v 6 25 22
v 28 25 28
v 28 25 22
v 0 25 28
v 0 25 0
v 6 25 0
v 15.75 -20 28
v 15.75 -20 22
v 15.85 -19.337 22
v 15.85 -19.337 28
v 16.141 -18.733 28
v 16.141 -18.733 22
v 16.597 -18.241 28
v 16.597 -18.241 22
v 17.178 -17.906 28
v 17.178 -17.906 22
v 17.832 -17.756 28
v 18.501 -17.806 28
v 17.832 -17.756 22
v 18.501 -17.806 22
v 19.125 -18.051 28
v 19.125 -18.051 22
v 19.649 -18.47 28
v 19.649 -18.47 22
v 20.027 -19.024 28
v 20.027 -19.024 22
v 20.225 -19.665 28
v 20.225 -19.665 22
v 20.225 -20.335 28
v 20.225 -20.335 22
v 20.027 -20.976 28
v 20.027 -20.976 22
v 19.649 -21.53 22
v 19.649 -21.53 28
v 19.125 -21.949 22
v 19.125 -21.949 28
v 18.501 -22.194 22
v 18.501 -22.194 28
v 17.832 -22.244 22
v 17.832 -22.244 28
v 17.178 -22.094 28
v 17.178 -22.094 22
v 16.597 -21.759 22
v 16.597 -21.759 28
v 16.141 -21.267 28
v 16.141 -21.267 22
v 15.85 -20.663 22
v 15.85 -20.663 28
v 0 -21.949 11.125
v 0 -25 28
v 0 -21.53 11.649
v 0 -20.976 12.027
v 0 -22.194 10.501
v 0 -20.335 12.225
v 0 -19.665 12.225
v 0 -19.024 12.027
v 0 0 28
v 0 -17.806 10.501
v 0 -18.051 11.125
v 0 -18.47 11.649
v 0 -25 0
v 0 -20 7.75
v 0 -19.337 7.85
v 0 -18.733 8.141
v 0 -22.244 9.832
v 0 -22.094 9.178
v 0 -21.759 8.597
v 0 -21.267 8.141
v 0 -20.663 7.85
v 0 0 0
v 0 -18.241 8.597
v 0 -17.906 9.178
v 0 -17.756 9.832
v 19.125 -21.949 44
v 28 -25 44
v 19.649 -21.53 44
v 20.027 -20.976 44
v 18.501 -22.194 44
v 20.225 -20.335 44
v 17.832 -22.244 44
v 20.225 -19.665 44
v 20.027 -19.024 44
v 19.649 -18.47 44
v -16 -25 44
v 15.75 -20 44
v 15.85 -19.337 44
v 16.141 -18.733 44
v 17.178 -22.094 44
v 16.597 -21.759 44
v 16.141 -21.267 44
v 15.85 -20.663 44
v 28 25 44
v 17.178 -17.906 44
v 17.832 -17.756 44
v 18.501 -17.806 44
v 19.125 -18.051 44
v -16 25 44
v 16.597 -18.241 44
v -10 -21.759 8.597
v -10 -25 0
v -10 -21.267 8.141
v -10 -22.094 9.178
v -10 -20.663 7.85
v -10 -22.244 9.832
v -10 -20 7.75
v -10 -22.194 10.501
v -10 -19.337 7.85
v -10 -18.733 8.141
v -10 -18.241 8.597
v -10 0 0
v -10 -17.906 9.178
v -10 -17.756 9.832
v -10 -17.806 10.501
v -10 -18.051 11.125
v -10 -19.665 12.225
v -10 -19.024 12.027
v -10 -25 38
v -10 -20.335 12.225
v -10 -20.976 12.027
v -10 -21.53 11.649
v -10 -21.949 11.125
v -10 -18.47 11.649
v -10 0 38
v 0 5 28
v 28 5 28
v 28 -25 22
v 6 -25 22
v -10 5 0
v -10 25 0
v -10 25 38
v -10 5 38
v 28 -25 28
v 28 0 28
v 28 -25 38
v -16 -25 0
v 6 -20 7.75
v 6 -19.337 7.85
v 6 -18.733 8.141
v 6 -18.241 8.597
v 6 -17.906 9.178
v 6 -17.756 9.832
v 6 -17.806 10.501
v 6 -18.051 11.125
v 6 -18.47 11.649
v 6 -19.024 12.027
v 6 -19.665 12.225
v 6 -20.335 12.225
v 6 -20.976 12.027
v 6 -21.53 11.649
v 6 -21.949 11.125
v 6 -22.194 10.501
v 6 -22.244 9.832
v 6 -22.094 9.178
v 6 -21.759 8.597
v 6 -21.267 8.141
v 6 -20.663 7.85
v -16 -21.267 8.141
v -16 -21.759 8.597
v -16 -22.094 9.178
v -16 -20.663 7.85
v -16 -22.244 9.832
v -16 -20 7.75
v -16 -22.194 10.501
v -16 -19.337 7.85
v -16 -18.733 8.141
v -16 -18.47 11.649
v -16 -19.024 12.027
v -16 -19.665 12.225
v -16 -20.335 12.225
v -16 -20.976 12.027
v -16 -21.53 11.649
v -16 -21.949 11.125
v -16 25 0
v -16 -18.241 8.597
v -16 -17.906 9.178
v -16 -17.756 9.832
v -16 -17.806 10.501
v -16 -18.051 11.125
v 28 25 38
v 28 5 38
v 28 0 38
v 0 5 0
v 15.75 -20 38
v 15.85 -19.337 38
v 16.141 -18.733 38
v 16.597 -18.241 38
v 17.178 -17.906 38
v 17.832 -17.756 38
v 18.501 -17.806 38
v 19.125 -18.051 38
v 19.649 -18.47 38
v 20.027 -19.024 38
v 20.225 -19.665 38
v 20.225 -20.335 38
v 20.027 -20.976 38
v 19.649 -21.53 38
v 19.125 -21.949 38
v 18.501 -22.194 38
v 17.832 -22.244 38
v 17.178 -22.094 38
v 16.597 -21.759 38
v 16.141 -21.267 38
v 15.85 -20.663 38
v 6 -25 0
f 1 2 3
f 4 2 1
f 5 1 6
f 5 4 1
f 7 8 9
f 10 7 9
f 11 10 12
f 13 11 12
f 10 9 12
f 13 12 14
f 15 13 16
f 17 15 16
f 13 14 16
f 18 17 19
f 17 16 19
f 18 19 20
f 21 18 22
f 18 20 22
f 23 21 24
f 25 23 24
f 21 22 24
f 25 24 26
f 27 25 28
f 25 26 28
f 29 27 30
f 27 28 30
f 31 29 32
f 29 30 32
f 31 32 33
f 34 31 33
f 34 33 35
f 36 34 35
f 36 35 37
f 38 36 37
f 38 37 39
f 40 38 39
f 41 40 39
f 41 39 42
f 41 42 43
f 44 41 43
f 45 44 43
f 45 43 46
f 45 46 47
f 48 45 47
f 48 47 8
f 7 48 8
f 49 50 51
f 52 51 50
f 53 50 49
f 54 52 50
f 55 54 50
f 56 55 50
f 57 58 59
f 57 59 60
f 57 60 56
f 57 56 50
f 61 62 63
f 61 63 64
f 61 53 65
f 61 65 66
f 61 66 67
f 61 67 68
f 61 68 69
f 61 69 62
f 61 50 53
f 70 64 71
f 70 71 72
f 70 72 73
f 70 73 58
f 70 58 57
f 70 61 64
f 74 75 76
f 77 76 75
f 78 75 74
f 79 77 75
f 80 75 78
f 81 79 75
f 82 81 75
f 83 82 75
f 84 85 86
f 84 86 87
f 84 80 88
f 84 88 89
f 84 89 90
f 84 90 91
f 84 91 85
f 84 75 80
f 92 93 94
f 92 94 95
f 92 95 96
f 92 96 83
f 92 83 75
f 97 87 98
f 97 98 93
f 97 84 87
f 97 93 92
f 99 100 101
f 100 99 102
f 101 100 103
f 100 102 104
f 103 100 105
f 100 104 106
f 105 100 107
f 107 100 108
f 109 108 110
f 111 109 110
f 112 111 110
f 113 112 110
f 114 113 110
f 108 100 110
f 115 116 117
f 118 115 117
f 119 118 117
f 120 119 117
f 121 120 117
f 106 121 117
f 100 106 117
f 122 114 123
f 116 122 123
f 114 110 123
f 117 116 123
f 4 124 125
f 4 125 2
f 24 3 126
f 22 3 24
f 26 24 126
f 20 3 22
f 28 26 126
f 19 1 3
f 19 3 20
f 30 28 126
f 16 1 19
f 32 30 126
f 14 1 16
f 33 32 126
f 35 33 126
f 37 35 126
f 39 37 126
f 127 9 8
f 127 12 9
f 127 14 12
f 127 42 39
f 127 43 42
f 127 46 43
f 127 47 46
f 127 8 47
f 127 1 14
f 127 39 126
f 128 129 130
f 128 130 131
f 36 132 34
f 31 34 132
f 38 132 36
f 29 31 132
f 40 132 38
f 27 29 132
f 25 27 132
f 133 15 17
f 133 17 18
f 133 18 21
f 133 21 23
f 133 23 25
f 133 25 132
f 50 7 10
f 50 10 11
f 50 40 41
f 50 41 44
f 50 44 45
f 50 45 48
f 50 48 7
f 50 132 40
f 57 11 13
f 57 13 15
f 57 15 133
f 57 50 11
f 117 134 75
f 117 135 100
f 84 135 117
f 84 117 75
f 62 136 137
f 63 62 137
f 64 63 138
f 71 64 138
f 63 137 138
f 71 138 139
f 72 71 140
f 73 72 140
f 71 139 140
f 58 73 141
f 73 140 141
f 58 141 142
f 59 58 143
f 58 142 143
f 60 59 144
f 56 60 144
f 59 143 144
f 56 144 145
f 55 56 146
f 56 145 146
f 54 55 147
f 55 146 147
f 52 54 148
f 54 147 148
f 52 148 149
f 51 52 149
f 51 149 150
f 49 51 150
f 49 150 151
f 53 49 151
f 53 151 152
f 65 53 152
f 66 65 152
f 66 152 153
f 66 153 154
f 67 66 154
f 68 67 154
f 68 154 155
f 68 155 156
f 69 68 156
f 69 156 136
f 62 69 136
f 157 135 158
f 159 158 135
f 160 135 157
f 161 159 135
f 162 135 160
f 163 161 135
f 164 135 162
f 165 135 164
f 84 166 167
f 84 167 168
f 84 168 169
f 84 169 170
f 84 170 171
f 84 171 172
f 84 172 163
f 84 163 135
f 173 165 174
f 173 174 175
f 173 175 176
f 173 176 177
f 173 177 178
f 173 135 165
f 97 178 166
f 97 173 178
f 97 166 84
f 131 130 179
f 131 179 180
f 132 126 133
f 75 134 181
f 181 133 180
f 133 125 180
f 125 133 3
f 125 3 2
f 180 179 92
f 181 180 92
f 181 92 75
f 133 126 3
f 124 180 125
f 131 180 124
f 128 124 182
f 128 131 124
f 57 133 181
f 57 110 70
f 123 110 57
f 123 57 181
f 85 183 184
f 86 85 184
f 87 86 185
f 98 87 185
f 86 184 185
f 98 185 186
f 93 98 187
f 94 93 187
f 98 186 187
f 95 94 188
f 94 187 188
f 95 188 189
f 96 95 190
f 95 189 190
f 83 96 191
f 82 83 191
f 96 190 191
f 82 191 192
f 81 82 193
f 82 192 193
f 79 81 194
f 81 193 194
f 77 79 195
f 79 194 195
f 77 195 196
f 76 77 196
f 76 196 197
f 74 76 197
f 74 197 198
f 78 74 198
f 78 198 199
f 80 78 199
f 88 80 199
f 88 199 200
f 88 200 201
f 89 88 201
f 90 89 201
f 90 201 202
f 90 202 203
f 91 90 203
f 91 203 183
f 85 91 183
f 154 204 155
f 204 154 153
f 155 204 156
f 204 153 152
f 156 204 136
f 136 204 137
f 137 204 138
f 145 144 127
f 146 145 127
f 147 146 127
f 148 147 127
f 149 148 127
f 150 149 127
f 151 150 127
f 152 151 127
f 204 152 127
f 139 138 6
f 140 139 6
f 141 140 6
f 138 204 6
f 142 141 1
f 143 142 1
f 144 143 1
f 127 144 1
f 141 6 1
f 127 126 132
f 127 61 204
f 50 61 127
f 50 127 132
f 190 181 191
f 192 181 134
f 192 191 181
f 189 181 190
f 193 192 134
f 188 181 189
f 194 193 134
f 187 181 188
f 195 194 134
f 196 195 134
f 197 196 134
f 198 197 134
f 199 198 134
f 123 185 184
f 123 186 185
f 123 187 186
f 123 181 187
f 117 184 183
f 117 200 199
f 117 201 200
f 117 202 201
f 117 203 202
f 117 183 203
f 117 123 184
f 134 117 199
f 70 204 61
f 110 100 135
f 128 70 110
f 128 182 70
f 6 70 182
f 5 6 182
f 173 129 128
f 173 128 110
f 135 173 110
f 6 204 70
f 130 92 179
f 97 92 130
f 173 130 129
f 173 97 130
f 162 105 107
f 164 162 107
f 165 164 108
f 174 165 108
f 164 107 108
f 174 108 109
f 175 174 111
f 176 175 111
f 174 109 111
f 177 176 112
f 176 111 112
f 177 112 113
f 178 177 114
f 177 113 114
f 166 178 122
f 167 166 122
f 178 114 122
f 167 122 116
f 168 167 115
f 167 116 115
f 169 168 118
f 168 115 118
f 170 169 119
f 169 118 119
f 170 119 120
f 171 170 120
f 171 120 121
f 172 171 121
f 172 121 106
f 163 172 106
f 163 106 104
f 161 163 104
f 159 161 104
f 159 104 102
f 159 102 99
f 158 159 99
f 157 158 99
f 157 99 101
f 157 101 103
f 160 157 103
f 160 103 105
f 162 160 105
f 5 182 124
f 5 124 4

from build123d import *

# Parameters (mm, degrees)
ESTRUSIONE_ESTRUSIONE1_DEPTH = 28
ESTRUSIONE_ESTRUSIONE2_DEPTH = 16
SCHIZZO4_W                   = 16
SCHIZZO4_H                   = 50
ESTRUSIONE_ESTRUSIONE3_DEPTH = 6
ESTRUSIONE_ESTRUSIONE4_DEPTH = 22
FORO_PER_VITE_M4_1_D         = 4.5
FORO_PER_VITE_M4_1_DEPTH     = 30
FORO_PER_VITE_M4_1_TIP       = 1.351936393
FORO_PER_VITE_M4_2_D         = 4.5
FORO_PER_VITE_M4_2_DEPTH     = 30
FORO_PER_VITE_M4_2_TIP       = 1.351936393


with BuildPart() as part:
    # Schizzo2 → Estrusione-Estrusione1 (new body)
    with BuildSketch(Plane.XY):
        Polygon((0, 0), (-10, 0), (-10, -25), (-16, -25), (-16, 25), (-10, 25), (-10, 5), (0, 5), (0, 25), (6, 25), (6, -25), (0, -25), align=None)
    extrude(amount=ESTRUSIONE_ESTRUSIONE1_DEPTH)

    # Schizzo3 → Estrusione-Estrusione2 (add)
    with BuildSketch(Plane(origin=(6, 0, 0), x_dir=(0, 0, -1), z_dir=(1, 0, 0))):
        Polygon((-28, 0), (-38, 0), (-38, -25), (-44, -25), (-44, 25), (-38, 25), (-38, 5), (-28, 5), align=None)
    extrude(amount=-ESTRUSIONE_ESTRUSIONE2_DEPTH)

    # Schizzo4 → Estrusione-Estrusione3 (add)
    with BuildSketch(Plane.ZY.offset(10)):
        with Locations((36, 0)):
            Rectangle(SCHIZZO4_W, SCHIZZO4_H)
    extrude(amount=ESTRUSIONE_ESTRUSIONE3_DEPTH)

    # Schizzo5 → Estrusione-Estrusione4 (add)
    with BuildSketch(Plane(origin=(6, 0, 0), x_dir=(0, 0, -1), z_dir=(1, 0, 0))):
        Polygon((-38, -25), (-44, -25), (-44, 25), (-38, 25), (-38, 5), (-28, 5), (-28, 25), (-22, 25), (-22, -25), (-28, -25), (-28, 0), (-38, 0), align=None)
    extrude(amount=ESTRUSIONE_ESTRUSIONE4_DEPTH)

    # Foro per Vite M4-1
    with Locations(Plane.XY.offset(44)):
        with Locations((18, -20)):
            Hole(FORO_PER_VITE_M4_1_D / 2, depth=FORO_PER_VITE_M4_1_DEPTH)
            with Locations((0, 0, -(FORO_PER_VITE_M4_1_DEPTH + FORO_PER_VITE_M4_1_TIP / 2))):  # 118° drill point
                Cone(0, FORO_PER_VITE_M4_1_D / 2, FORO_PER_VITE_M4_1_TIP, mode=Mode.SUBTRACT)

    # Foro per Vite M4-2
    with Locations(Plane.ZY.offset(16)):
        with Locations((10, -20)):
            Hole(FORO_PER_VITE_M4_2_D / 2, depth=FORO_PER_VITE_M4_2_DEPTH)
            with Locations((0, 0, -(FORO_PER_VITE_M4_2_DEPTH + FORO_PER_VITE_M4_2_TIP / 2))):  # 118° drill point
                Cone(0, FORO_PER_VITE_M4_2_D / 2, FORO_PER_VITE_M4_2_TIP, mode=Mode.SUBTRACT)


solid = part.part
